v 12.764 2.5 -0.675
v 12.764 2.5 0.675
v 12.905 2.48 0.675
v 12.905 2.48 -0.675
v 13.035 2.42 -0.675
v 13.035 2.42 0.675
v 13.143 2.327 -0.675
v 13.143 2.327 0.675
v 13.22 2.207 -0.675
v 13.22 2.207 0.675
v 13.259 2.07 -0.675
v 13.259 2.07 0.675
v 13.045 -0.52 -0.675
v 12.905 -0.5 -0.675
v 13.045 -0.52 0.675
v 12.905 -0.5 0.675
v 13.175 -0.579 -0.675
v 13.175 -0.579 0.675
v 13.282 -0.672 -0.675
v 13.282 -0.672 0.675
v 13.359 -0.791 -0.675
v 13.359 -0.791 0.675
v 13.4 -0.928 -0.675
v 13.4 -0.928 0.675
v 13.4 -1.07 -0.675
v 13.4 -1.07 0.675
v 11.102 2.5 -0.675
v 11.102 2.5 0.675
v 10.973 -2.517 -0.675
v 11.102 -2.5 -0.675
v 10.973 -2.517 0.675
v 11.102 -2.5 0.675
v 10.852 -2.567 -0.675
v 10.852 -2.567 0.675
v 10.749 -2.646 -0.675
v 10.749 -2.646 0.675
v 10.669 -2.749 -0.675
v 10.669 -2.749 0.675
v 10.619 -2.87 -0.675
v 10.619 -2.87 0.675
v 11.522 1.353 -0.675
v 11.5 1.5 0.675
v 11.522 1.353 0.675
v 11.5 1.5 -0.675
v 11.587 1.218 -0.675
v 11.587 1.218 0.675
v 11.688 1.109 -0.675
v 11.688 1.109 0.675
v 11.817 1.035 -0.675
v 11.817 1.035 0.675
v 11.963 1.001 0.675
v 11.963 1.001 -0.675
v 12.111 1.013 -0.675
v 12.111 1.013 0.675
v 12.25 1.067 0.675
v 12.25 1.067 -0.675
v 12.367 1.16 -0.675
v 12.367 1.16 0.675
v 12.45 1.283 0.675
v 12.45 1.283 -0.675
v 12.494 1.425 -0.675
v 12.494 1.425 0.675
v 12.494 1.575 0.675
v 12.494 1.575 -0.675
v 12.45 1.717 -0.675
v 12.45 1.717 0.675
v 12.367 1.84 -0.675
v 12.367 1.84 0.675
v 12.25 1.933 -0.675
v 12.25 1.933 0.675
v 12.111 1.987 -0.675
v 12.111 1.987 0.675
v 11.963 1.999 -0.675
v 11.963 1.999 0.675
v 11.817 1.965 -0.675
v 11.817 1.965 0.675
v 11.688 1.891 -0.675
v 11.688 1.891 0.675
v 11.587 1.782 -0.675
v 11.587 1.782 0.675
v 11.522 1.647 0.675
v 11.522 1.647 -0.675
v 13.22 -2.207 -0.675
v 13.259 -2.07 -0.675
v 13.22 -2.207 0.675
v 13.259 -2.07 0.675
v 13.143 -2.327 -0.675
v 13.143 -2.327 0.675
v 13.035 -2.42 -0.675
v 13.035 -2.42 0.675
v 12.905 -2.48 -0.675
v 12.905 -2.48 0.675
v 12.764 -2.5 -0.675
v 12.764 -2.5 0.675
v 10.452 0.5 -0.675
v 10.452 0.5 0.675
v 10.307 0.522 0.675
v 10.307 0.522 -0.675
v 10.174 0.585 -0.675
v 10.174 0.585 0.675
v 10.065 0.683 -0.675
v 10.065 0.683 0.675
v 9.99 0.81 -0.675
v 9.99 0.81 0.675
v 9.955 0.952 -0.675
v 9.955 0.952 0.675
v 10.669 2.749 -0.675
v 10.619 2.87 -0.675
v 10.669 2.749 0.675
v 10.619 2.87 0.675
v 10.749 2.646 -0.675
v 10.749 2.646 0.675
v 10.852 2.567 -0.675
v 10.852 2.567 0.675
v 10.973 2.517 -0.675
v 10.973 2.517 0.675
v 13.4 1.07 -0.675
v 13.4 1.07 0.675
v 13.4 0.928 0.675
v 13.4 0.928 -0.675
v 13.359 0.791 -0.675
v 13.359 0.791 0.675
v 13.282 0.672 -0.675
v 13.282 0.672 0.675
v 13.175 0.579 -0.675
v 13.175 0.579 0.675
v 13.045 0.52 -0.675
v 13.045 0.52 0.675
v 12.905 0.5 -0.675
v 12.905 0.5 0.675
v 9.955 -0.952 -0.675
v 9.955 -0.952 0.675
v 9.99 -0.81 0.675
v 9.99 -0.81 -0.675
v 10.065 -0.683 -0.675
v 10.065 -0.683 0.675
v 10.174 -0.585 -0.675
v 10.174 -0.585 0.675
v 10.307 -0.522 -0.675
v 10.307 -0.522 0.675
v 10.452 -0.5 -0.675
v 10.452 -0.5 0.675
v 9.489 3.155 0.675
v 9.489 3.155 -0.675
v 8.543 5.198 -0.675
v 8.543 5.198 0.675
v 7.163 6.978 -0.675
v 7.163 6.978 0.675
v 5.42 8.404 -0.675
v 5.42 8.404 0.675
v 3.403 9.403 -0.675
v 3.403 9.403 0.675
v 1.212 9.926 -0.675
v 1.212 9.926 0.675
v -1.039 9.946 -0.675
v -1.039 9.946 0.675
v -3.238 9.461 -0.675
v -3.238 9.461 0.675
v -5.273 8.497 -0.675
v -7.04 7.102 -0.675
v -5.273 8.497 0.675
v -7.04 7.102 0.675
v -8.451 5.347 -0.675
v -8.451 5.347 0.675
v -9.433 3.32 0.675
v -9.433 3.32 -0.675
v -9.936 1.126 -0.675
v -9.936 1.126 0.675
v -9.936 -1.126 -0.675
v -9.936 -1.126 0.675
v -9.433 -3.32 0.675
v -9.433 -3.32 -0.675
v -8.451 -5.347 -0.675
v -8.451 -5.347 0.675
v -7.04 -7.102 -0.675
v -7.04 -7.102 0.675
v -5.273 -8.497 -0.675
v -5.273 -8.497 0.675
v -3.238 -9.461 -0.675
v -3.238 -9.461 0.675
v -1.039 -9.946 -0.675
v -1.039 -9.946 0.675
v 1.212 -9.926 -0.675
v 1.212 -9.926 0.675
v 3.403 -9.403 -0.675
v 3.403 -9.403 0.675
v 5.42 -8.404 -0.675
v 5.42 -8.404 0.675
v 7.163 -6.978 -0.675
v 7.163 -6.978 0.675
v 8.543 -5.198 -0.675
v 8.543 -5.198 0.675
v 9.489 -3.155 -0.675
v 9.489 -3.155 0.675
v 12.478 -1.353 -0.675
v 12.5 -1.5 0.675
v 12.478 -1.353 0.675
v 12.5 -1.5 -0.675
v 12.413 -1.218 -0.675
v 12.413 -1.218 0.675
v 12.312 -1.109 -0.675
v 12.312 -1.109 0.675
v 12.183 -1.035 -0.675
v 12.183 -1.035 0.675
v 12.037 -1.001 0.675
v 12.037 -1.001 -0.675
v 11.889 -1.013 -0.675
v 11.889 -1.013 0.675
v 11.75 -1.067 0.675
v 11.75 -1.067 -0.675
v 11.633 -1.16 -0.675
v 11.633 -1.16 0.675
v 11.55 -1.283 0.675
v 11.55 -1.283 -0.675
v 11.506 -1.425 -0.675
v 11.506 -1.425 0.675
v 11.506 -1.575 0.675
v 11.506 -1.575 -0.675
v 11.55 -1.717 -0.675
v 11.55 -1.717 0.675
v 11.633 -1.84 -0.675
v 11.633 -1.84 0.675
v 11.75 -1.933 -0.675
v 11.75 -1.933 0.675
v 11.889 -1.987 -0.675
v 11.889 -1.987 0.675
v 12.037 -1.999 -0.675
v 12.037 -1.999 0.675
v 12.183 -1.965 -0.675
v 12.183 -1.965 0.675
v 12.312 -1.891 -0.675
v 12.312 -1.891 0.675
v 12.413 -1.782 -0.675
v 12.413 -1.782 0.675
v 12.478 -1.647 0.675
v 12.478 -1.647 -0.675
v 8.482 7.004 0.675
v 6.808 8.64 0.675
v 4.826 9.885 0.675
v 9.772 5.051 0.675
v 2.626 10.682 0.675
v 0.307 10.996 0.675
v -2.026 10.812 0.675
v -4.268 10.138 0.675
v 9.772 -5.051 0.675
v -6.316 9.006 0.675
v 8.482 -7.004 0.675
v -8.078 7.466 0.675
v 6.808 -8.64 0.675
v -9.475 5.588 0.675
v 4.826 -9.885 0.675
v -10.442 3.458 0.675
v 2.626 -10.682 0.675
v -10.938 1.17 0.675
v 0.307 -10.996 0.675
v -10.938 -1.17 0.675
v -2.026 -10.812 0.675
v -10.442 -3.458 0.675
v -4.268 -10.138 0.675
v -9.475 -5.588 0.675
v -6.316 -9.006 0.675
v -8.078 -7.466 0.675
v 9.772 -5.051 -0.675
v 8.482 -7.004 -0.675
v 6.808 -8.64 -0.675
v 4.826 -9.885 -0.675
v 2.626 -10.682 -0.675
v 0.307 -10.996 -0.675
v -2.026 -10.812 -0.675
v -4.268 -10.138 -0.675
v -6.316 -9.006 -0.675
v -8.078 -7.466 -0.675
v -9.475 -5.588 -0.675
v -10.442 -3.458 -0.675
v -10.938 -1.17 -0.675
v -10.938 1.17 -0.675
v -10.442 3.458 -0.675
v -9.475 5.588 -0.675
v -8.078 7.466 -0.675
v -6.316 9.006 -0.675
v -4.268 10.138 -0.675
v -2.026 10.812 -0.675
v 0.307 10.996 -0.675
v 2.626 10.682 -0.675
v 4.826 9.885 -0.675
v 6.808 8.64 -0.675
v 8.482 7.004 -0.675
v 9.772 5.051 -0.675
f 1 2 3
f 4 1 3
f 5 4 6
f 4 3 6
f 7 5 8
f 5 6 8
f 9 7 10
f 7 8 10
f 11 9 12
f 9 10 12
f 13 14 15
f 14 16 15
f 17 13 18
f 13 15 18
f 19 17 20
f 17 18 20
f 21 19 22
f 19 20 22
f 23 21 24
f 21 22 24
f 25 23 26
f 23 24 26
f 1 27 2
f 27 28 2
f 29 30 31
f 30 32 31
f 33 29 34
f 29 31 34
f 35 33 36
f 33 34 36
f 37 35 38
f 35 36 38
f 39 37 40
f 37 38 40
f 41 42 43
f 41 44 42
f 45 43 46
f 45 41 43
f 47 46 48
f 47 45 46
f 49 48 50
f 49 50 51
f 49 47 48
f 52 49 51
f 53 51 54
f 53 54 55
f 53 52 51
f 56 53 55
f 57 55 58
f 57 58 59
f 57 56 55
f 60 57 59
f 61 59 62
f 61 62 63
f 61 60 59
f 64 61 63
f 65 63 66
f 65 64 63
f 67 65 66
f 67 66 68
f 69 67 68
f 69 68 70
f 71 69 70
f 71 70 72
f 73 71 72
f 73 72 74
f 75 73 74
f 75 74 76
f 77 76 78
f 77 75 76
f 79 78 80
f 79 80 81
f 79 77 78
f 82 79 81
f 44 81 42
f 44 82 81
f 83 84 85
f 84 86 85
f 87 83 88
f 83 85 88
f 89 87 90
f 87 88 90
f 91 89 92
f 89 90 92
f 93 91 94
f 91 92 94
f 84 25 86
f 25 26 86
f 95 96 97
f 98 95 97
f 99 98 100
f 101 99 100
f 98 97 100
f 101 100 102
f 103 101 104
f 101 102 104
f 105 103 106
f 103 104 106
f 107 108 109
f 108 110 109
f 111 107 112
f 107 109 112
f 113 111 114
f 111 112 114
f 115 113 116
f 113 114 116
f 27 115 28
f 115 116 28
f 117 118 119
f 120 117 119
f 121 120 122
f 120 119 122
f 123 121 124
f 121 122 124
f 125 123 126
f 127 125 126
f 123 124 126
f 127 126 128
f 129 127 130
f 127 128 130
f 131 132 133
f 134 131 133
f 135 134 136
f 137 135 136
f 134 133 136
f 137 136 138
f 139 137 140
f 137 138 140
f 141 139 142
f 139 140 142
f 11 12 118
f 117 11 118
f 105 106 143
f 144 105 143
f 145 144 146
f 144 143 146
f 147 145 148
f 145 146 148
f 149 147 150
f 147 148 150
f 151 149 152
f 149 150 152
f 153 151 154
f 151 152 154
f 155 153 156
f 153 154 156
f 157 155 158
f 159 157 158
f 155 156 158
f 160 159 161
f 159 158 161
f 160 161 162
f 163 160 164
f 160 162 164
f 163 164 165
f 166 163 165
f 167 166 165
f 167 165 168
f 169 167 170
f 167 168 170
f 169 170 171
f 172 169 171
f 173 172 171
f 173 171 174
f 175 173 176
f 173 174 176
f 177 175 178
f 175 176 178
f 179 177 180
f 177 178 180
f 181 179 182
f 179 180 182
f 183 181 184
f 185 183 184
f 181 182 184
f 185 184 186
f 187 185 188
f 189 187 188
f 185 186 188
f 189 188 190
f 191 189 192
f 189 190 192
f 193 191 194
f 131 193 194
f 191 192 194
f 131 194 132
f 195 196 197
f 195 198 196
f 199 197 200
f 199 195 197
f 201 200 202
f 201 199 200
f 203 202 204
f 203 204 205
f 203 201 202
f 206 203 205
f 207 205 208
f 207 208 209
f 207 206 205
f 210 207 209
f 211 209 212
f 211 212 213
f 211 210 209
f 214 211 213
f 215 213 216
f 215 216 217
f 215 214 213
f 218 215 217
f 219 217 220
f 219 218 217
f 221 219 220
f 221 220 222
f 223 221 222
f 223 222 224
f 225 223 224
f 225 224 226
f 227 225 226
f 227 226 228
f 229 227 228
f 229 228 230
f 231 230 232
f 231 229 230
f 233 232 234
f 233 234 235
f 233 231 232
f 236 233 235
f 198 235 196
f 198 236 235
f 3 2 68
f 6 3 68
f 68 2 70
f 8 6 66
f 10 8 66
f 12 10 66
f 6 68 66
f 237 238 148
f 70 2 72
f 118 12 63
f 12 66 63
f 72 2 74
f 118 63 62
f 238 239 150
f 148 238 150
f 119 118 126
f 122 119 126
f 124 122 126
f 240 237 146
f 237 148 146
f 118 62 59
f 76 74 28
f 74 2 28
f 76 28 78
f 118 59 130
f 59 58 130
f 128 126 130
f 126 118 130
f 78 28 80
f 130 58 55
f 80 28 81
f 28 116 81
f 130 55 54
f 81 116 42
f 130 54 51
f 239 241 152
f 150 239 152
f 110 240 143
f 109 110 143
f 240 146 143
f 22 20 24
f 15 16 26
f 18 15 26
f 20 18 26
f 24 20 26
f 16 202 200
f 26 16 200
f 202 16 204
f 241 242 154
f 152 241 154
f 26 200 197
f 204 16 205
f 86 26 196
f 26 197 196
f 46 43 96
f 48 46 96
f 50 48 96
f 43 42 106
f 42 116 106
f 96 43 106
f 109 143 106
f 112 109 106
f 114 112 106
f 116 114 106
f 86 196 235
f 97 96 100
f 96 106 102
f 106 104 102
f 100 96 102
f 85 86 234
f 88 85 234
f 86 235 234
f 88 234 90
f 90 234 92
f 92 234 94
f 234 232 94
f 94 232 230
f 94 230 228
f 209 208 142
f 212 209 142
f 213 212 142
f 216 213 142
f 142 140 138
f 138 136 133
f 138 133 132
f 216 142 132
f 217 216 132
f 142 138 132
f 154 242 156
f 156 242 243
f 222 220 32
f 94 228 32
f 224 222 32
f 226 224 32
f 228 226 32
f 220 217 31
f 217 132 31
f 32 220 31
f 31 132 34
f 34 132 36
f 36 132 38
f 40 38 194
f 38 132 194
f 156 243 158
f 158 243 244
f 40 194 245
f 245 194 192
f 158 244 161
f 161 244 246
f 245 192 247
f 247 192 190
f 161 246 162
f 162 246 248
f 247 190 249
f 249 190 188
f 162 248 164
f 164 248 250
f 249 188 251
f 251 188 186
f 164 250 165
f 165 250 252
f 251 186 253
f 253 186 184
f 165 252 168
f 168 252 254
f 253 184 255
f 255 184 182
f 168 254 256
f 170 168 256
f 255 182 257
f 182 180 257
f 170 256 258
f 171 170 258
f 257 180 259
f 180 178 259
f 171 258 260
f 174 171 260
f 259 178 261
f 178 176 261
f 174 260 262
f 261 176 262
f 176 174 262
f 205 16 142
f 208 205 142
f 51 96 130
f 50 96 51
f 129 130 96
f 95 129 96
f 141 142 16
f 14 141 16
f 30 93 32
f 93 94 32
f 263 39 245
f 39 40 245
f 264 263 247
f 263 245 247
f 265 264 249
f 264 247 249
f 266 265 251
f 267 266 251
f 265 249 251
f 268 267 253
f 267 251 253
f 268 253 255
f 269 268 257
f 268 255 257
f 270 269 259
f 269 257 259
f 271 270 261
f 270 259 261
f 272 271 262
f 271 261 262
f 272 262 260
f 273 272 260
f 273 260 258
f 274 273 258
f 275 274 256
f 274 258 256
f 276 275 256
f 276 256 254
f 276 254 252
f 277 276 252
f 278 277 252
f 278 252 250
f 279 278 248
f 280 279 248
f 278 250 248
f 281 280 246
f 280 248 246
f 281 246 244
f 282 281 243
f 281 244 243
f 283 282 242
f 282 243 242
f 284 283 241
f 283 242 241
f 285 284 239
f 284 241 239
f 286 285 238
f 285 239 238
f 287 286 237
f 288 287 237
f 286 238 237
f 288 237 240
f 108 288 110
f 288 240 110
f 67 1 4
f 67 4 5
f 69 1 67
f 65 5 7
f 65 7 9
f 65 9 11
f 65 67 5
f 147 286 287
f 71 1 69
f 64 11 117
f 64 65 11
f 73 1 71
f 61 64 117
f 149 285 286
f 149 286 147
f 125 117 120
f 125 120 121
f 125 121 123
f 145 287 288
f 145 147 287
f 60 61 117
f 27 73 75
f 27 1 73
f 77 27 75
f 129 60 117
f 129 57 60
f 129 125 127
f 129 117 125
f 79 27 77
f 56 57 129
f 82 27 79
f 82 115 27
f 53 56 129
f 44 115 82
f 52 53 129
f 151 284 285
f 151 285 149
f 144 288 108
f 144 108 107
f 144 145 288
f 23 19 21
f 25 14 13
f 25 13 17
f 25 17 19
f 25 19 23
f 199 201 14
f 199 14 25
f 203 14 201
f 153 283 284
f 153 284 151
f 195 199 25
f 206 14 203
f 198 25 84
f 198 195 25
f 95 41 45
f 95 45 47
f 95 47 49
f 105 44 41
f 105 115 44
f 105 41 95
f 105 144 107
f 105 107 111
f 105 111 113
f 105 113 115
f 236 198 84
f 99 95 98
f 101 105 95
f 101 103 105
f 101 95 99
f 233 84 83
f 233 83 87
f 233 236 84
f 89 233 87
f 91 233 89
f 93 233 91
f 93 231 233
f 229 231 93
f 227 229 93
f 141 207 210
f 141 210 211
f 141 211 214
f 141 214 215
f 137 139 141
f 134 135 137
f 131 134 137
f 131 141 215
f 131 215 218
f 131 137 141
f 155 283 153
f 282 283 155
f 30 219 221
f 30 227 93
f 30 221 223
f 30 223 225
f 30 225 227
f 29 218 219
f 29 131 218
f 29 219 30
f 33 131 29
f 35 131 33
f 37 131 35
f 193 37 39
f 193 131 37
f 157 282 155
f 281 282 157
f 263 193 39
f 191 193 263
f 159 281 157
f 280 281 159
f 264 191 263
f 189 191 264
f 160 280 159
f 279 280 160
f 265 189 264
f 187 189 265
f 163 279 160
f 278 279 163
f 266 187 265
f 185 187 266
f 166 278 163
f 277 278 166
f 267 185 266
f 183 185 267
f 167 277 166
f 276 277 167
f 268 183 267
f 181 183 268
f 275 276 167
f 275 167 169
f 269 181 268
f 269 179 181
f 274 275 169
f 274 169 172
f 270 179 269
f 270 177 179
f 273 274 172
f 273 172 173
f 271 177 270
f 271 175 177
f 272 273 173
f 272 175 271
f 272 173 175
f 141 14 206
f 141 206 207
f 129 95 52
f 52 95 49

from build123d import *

# Parameters (mm, degrees)
SKETCH1_R           = 0.5
BOSS_EXTRUDE1_DEPTH = 0.675


with BuildPart() as part:
    # Sketch1 → Boss-Extrude1 (new, symmetric)
    with BuildSketch(Plane(origin=(0, 0, 0), x_dir=(0, 1, 0), z_dir=(0, 0, 1))):
        with BuildLine():
            Line((-0.5, -10.45227248), (-0.5, -12.904865966))
            ThreePointArc((-0.5, -12.904865966), (-0.671970486, -13.282220756), (-1.06958655, -13.4))
            Line((-1.06958655, -13.4), (-2.06958655, -13.259459165))
            ThreePointArc((-2.06958655, -13.259459165), (-2.37735479, -13.092354645), (-2.5, -12.764325131))
            Line((-2.5, -12.764325131), (-2.5, -11.101801656))
            ThreePointArc((-2.5, -11.101801656), (-2.603000383, -10.797842276), (-2.869565217, -10.619114627))
            ThreePointArc((-2.869565217, -10.619114627), (0, 11), (2.869565217, -10.619114627))
            ThreePointArc((2.869565217, -10.619114627), (2.603000383, -10.797842276), (2.5, -11.101801656))
            Line((2.5, -11.101801656), (2.5, -12.764325131))
            ThreePointArc((2.5, -12.764325131), (2.37735479, -13.092354645), (2.06958655, -13.259459165))
            Line((2.06958655, -13.259459165), (1.06958655, -13.4))
            ThreePointArc((1.06958655, -13.4), (0.671970486, -13.282220756), (0.5, -12.904865966))
            Line((0.5, -12.904865966), (0.5, -10.45227248))
            ThreePointArc((0.5, -10.45227248), (0.629993565, -10.115976126), (0.952380952, -9.954545219))
            ThreePointArc((0.952380952, -9.954545219), (0, 10), (-0.952380952, -9.954545219))
            ThreePointArc((-0.952380952, -9.954545219), (-0.629993565, -10.115976126), (-0.5, -10.45227248))
        make_face()
        with Locations(Location((-1.5, -12, 0), (0, 0, 270))):
            Circle(SKETCH1_R, mode=Mode.SUBTRACT)
        with Locations(Location((1.5, -12, 0), (0, 0, 90))):
            Circle(SKETCH1_R, mode=Mode.SUBTRACT)
    extrude(amount=BOSS_EXTRUDE1_DEPTH, both=True)


solid = part.part
